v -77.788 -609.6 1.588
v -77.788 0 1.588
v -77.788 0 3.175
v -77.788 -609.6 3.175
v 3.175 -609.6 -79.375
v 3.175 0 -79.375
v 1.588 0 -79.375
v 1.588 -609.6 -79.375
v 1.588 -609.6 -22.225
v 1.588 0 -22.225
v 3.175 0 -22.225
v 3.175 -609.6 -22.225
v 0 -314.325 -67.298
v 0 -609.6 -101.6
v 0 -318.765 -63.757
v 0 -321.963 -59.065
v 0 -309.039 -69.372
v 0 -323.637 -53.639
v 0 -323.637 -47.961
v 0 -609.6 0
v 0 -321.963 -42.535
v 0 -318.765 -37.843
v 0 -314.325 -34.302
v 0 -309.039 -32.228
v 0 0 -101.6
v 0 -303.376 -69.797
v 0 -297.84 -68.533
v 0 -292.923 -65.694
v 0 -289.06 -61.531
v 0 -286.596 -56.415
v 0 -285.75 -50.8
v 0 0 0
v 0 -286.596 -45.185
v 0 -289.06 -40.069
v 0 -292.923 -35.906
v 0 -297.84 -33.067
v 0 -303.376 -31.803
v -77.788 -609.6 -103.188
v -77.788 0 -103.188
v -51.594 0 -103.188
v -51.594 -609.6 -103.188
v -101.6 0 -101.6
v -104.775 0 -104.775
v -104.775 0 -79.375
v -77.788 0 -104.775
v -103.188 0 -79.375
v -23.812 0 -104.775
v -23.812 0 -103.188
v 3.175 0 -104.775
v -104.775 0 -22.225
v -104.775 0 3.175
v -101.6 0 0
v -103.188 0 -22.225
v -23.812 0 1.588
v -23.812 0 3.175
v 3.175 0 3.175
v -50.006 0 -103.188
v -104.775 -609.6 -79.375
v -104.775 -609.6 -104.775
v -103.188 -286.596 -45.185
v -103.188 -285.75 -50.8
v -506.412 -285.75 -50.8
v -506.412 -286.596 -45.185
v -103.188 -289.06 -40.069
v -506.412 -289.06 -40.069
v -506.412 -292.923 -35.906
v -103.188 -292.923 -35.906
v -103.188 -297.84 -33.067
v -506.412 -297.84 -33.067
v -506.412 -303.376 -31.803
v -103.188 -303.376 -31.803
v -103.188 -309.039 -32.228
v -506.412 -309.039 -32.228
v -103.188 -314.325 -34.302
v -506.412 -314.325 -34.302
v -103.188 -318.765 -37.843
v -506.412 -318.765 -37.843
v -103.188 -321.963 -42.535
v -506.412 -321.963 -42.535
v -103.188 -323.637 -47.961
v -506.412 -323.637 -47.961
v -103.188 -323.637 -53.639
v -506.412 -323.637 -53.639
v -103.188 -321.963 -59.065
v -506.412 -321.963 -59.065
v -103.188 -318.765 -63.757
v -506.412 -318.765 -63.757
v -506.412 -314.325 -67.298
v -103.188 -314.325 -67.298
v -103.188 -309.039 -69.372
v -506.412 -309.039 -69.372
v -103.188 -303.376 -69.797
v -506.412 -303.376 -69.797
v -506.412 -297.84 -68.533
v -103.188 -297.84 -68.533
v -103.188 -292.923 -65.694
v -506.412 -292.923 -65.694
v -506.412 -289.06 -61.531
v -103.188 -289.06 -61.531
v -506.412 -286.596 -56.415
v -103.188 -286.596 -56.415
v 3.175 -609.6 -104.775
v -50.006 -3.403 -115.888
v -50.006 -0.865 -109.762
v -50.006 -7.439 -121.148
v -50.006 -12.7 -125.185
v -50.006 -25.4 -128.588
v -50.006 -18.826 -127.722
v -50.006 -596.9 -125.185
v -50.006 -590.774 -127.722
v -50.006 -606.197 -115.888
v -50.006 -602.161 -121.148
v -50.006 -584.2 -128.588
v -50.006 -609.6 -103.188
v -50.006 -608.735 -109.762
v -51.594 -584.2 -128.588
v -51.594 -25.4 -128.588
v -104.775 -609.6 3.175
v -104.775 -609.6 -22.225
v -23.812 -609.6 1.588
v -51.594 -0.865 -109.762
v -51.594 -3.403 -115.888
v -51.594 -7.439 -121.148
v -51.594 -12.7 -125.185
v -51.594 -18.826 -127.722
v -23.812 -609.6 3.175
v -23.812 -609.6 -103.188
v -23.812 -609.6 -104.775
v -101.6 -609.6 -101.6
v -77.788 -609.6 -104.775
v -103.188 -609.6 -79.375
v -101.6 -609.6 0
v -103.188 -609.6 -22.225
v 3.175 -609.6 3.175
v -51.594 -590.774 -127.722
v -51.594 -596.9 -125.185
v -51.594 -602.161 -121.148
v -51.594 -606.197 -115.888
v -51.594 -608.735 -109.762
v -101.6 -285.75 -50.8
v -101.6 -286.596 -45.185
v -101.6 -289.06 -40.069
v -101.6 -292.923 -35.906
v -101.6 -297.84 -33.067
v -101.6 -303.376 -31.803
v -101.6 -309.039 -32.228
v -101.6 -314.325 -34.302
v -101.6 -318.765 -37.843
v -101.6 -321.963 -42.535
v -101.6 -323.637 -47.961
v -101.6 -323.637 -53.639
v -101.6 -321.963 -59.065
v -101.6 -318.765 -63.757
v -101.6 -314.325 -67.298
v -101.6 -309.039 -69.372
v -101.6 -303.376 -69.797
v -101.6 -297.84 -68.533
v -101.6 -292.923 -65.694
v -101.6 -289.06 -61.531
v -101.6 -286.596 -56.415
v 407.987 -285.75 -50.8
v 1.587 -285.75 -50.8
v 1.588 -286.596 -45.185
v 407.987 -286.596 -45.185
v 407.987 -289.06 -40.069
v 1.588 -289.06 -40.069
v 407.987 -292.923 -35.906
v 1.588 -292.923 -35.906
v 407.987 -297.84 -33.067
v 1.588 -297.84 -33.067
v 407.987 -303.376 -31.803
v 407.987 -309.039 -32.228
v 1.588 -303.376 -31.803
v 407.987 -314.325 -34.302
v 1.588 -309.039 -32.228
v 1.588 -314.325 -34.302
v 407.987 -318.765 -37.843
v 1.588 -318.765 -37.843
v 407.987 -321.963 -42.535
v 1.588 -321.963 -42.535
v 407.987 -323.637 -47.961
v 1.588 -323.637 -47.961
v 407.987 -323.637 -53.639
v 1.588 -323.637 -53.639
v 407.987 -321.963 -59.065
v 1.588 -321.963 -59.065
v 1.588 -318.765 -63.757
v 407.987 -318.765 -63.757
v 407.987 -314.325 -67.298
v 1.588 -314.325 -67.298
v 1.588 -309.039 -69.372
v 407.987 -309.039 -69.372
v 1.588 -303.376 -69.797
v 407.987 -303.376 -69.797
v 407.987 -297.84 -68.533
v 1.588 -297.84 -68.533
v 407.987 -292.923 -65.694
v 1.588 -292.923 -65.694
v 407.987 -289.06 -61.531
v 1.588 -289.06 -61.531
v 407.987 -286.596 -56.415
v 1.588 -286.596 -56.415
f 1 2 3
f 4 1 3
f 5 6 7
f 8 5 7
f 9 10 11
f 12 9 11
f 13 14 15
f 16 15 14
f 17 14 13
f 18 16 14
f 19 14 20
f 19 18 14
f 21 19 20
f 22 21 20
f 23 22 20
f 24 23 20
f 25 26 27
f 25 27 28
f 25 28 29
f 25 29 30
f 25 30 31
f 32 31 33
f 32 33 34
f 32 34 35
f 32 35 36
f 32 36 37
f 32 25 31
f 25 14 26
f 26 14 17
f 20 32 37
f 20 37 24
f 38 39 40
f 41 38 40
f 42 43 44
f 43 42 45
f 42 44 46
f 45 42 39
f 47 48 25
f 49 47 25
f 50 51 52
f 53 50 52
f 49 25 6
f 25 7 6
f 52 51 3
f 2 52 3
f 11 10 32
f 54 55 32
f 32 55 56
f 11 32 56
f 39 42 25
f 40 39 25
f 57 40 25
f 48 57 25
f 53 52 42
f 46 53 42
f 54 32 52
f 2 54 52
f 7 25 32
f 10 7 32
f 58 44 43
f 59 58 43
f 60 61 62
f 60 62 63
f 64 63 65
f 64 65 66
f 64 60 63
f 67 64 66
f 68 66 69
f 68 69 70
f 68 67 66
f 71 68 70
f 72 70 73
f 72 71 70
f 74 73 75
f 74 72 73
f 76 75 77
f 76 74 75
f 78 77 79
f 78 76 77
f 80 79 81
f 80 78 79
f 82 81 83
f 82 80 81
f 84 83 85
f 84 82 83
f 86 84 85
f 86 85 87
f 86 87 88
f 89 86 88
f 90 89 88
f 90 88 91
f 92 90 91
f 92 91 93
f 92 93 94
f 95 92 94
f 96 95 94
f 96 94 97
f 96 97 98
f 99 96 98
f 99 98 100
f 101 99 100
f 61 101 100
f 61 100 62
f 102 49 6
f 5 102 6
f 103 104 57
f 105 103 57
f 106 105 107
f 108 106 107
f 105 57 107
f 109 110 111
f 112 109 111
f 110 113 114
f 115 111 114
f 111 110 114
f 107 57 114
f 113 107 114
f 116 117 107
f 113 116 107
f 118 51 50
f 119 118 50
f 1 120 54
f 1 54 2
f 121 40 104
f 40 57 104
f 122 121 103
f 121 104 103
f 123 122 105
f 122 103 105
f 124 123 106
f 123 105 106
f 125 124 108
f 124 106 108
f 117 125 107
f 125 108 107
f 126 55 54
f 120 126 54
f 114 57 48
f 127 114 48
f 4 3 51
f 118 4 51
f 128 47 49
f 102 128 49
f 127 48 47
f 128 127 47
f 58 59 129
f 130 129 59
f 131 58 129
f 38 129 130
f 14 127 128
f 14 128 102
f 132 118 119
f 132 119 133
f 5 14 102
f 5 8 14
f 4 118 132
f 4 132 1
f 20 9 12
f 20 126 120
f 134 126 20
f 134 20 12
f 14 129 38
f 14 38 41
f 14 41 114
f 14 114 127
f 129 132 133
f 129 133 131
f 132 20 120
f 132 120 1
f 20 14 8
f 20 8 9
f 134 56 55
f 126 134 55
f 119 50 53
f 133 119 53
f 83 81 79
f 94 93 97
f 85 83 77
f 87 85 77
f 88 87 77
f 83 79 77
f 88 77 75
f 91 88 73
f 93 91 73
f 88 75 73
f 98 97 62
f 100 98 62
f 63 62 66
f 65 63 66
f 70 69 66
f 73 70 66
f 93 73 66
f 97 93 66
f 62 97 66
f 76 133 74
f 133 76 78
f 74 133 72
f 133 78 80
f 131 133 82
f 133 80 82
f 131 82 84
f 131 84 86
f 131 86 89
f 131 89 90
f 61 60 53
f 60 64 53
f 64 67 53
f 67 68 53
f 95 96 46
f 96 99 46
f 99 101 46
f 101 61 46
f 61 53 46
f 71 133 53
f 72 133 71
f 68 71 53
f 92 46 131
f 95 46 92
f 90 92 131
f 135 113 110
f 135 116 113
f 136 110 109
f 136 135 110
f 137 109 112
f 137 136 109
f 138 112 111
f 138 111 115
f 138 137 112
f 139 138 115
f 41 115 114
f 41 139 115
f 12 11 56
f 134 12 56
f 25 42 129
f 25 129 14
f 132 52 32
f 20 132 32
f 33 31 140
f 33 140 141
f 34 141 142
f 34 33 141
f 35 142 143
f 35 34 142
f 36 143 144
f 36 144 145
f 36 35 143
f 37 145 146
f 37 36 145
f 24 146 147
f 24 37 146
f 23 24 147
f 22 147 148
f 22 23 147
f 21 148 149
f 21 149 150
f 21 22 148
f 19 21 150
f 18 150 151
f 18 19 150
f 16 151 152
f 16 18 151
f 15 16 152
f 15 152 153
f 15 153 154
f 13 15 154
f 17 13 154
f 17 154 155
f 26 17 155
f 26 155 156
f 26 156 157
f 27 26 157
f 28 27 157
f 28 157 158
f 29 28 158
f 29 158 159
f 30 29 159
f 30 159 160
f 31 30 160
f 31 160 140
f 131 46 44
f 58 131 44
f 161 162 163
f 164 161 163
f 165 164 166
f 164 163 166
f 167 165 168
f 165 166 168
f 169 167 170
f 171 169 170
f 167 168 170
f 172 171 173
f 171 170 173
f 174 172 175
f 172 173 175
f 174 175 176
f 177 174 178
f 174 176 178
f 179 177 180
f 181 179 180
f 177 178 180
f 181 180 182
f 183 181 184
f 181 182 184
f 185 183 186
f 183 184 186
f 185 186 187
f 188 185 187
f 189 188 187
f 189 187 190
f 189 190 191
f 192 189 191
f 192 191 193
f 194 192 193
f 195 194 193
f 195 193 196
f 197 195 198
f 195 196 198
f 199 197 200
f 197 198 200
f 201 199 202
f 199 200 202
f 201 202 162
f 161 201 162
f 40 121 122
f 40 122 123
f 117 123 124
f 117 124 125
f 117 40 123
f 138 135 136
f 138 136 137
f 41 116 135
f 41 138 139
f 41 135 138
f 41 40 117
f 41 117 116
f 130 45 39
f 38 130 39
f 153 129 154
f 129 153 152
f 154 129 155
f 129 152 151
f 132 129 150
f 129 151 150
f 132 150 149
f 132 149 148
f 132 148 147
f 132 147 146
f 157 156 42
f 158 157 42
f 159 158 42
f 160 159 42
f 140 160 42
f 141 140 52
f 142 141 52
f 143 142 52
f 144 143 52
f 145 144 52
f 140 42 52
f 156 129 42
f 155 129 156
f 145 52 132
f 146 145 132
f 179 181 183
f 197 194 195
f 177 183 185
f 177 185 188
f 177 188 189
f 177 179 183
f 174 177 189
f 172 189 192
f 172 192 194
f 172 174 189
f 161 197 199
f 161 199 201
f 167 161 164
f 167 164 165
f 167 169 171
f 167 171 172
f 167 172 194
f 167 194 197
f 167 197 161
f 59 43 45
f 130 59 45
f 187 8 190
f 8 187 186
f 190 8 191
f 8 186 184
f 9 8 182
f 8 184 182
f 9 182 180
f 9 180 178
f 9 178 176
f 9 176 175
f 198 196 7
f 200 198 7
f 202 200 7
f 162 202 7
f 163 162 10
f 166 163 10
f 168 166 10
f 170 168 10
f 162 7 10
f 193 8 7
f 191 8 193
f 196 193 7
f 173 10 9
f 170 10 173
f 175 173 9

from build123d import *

# Parameters (mm, degrees)
F0_W          = 101.6
F0_H          = 101.6
F1_DEPTH      = 609.6
F2_R          = 19.05
F3_DEPTH      = 406.4
F3_DEPTH_BACK = 508
F4_W          = 0.79375
F4_H          = 609.6
F5_DEPTH      = 25.4
F6_R          = 25.4
F7_R          = 25.4


with BuildPart() as f1:
    # F0 (on Front) → F1 (new body)
    with BuildSketch(Plane.XZ):
        Polygon((-103.1875, -22.225), (-103.1875, 1.5875), (-77.7875, 1.5875), (-77.7875, 3.175), (-104.775, 3.175), (-104.775, -22.225), align=None)
        Polygon((-77.7875, 1.5875), (-103.1875, 1.5875), (-103.1875, -22.225), (-103.1875, -79.375), (-103.1875, -103.1875), (-77.7875, -103.1875), (-23.8125, -103.1875), (1.5875, -103.1875), (1.5875, -79.375), (1.5875, -22.225), (1.5875, 1.5875), (-23.8125, 1.5875), align=None)
        with Locations((-50.8, -50.8)):
            Rectangle(F0_W, F0_H, mode=Mode.SUBTRACT)
        Polygon((-103.1875, -103.1875), (-103.1875, -79.375), (-104.775, -79.375), (-104.775, -104.775), (-77.7875, -104.775), (-77.7875, -103.1875), align=None)
        Polygon((3.175, -79.375), (1.5875, -79.375), (1.5875, -103.1875), (-23.8125, -103.1875), (-23.8125, -104.775), (3.175, -104.775), align=None)
        Polygon((-23.8125, 3.175), (-23.8125, 1.5875), (1.5875, 1.5875), (1.5875, -22.225), (3.175, -22.225), (3.175, 3.175), align=None)
    extrude(amount=F1_DEPTH)

    # F2 (on face) → F3 (join, two sides)
    with BuildSketch(Plane.YZ.offset(1.5875)) as f3_sk:
        with Locations((-304.8, -50.8)):
            Circle(F2_R)
    extrude(amount=F3_DEPTH)
    extrude(f3_sk.sketch, amount=-F3_DEPTH_BACK)

    # F4 (on face) → F5 (join)
    with BuildSketch(Plane(origin=(0, 0, -103.1875), x_dir=(1, 0, 0), z_dir=(0, 0, -1))):
        with Locations((-50.403125, 304.8)):
            Rectangle(F4_W, F4_H)
        with Locations((-51.196875, 304.8)):
            Rectangle(F4_W, F4_H)
    extrude(amount=F5_DEPTH)

    # F6
    f6_edges = [f1.edges().sort_by_distance(p)[0] for p in [
        (-50.8, 0, -128.5875),
    ]]
    fillet(f6_edges, radius=F6_R)

    # F7
    f7_edges = [f1.edges().sort_by_distance(p)[0] for p in [
        (-50.8, -609.6, -128.5875),
    ]]
    fillet(f7_edges, radius=F7_R)


solid = f1.part
